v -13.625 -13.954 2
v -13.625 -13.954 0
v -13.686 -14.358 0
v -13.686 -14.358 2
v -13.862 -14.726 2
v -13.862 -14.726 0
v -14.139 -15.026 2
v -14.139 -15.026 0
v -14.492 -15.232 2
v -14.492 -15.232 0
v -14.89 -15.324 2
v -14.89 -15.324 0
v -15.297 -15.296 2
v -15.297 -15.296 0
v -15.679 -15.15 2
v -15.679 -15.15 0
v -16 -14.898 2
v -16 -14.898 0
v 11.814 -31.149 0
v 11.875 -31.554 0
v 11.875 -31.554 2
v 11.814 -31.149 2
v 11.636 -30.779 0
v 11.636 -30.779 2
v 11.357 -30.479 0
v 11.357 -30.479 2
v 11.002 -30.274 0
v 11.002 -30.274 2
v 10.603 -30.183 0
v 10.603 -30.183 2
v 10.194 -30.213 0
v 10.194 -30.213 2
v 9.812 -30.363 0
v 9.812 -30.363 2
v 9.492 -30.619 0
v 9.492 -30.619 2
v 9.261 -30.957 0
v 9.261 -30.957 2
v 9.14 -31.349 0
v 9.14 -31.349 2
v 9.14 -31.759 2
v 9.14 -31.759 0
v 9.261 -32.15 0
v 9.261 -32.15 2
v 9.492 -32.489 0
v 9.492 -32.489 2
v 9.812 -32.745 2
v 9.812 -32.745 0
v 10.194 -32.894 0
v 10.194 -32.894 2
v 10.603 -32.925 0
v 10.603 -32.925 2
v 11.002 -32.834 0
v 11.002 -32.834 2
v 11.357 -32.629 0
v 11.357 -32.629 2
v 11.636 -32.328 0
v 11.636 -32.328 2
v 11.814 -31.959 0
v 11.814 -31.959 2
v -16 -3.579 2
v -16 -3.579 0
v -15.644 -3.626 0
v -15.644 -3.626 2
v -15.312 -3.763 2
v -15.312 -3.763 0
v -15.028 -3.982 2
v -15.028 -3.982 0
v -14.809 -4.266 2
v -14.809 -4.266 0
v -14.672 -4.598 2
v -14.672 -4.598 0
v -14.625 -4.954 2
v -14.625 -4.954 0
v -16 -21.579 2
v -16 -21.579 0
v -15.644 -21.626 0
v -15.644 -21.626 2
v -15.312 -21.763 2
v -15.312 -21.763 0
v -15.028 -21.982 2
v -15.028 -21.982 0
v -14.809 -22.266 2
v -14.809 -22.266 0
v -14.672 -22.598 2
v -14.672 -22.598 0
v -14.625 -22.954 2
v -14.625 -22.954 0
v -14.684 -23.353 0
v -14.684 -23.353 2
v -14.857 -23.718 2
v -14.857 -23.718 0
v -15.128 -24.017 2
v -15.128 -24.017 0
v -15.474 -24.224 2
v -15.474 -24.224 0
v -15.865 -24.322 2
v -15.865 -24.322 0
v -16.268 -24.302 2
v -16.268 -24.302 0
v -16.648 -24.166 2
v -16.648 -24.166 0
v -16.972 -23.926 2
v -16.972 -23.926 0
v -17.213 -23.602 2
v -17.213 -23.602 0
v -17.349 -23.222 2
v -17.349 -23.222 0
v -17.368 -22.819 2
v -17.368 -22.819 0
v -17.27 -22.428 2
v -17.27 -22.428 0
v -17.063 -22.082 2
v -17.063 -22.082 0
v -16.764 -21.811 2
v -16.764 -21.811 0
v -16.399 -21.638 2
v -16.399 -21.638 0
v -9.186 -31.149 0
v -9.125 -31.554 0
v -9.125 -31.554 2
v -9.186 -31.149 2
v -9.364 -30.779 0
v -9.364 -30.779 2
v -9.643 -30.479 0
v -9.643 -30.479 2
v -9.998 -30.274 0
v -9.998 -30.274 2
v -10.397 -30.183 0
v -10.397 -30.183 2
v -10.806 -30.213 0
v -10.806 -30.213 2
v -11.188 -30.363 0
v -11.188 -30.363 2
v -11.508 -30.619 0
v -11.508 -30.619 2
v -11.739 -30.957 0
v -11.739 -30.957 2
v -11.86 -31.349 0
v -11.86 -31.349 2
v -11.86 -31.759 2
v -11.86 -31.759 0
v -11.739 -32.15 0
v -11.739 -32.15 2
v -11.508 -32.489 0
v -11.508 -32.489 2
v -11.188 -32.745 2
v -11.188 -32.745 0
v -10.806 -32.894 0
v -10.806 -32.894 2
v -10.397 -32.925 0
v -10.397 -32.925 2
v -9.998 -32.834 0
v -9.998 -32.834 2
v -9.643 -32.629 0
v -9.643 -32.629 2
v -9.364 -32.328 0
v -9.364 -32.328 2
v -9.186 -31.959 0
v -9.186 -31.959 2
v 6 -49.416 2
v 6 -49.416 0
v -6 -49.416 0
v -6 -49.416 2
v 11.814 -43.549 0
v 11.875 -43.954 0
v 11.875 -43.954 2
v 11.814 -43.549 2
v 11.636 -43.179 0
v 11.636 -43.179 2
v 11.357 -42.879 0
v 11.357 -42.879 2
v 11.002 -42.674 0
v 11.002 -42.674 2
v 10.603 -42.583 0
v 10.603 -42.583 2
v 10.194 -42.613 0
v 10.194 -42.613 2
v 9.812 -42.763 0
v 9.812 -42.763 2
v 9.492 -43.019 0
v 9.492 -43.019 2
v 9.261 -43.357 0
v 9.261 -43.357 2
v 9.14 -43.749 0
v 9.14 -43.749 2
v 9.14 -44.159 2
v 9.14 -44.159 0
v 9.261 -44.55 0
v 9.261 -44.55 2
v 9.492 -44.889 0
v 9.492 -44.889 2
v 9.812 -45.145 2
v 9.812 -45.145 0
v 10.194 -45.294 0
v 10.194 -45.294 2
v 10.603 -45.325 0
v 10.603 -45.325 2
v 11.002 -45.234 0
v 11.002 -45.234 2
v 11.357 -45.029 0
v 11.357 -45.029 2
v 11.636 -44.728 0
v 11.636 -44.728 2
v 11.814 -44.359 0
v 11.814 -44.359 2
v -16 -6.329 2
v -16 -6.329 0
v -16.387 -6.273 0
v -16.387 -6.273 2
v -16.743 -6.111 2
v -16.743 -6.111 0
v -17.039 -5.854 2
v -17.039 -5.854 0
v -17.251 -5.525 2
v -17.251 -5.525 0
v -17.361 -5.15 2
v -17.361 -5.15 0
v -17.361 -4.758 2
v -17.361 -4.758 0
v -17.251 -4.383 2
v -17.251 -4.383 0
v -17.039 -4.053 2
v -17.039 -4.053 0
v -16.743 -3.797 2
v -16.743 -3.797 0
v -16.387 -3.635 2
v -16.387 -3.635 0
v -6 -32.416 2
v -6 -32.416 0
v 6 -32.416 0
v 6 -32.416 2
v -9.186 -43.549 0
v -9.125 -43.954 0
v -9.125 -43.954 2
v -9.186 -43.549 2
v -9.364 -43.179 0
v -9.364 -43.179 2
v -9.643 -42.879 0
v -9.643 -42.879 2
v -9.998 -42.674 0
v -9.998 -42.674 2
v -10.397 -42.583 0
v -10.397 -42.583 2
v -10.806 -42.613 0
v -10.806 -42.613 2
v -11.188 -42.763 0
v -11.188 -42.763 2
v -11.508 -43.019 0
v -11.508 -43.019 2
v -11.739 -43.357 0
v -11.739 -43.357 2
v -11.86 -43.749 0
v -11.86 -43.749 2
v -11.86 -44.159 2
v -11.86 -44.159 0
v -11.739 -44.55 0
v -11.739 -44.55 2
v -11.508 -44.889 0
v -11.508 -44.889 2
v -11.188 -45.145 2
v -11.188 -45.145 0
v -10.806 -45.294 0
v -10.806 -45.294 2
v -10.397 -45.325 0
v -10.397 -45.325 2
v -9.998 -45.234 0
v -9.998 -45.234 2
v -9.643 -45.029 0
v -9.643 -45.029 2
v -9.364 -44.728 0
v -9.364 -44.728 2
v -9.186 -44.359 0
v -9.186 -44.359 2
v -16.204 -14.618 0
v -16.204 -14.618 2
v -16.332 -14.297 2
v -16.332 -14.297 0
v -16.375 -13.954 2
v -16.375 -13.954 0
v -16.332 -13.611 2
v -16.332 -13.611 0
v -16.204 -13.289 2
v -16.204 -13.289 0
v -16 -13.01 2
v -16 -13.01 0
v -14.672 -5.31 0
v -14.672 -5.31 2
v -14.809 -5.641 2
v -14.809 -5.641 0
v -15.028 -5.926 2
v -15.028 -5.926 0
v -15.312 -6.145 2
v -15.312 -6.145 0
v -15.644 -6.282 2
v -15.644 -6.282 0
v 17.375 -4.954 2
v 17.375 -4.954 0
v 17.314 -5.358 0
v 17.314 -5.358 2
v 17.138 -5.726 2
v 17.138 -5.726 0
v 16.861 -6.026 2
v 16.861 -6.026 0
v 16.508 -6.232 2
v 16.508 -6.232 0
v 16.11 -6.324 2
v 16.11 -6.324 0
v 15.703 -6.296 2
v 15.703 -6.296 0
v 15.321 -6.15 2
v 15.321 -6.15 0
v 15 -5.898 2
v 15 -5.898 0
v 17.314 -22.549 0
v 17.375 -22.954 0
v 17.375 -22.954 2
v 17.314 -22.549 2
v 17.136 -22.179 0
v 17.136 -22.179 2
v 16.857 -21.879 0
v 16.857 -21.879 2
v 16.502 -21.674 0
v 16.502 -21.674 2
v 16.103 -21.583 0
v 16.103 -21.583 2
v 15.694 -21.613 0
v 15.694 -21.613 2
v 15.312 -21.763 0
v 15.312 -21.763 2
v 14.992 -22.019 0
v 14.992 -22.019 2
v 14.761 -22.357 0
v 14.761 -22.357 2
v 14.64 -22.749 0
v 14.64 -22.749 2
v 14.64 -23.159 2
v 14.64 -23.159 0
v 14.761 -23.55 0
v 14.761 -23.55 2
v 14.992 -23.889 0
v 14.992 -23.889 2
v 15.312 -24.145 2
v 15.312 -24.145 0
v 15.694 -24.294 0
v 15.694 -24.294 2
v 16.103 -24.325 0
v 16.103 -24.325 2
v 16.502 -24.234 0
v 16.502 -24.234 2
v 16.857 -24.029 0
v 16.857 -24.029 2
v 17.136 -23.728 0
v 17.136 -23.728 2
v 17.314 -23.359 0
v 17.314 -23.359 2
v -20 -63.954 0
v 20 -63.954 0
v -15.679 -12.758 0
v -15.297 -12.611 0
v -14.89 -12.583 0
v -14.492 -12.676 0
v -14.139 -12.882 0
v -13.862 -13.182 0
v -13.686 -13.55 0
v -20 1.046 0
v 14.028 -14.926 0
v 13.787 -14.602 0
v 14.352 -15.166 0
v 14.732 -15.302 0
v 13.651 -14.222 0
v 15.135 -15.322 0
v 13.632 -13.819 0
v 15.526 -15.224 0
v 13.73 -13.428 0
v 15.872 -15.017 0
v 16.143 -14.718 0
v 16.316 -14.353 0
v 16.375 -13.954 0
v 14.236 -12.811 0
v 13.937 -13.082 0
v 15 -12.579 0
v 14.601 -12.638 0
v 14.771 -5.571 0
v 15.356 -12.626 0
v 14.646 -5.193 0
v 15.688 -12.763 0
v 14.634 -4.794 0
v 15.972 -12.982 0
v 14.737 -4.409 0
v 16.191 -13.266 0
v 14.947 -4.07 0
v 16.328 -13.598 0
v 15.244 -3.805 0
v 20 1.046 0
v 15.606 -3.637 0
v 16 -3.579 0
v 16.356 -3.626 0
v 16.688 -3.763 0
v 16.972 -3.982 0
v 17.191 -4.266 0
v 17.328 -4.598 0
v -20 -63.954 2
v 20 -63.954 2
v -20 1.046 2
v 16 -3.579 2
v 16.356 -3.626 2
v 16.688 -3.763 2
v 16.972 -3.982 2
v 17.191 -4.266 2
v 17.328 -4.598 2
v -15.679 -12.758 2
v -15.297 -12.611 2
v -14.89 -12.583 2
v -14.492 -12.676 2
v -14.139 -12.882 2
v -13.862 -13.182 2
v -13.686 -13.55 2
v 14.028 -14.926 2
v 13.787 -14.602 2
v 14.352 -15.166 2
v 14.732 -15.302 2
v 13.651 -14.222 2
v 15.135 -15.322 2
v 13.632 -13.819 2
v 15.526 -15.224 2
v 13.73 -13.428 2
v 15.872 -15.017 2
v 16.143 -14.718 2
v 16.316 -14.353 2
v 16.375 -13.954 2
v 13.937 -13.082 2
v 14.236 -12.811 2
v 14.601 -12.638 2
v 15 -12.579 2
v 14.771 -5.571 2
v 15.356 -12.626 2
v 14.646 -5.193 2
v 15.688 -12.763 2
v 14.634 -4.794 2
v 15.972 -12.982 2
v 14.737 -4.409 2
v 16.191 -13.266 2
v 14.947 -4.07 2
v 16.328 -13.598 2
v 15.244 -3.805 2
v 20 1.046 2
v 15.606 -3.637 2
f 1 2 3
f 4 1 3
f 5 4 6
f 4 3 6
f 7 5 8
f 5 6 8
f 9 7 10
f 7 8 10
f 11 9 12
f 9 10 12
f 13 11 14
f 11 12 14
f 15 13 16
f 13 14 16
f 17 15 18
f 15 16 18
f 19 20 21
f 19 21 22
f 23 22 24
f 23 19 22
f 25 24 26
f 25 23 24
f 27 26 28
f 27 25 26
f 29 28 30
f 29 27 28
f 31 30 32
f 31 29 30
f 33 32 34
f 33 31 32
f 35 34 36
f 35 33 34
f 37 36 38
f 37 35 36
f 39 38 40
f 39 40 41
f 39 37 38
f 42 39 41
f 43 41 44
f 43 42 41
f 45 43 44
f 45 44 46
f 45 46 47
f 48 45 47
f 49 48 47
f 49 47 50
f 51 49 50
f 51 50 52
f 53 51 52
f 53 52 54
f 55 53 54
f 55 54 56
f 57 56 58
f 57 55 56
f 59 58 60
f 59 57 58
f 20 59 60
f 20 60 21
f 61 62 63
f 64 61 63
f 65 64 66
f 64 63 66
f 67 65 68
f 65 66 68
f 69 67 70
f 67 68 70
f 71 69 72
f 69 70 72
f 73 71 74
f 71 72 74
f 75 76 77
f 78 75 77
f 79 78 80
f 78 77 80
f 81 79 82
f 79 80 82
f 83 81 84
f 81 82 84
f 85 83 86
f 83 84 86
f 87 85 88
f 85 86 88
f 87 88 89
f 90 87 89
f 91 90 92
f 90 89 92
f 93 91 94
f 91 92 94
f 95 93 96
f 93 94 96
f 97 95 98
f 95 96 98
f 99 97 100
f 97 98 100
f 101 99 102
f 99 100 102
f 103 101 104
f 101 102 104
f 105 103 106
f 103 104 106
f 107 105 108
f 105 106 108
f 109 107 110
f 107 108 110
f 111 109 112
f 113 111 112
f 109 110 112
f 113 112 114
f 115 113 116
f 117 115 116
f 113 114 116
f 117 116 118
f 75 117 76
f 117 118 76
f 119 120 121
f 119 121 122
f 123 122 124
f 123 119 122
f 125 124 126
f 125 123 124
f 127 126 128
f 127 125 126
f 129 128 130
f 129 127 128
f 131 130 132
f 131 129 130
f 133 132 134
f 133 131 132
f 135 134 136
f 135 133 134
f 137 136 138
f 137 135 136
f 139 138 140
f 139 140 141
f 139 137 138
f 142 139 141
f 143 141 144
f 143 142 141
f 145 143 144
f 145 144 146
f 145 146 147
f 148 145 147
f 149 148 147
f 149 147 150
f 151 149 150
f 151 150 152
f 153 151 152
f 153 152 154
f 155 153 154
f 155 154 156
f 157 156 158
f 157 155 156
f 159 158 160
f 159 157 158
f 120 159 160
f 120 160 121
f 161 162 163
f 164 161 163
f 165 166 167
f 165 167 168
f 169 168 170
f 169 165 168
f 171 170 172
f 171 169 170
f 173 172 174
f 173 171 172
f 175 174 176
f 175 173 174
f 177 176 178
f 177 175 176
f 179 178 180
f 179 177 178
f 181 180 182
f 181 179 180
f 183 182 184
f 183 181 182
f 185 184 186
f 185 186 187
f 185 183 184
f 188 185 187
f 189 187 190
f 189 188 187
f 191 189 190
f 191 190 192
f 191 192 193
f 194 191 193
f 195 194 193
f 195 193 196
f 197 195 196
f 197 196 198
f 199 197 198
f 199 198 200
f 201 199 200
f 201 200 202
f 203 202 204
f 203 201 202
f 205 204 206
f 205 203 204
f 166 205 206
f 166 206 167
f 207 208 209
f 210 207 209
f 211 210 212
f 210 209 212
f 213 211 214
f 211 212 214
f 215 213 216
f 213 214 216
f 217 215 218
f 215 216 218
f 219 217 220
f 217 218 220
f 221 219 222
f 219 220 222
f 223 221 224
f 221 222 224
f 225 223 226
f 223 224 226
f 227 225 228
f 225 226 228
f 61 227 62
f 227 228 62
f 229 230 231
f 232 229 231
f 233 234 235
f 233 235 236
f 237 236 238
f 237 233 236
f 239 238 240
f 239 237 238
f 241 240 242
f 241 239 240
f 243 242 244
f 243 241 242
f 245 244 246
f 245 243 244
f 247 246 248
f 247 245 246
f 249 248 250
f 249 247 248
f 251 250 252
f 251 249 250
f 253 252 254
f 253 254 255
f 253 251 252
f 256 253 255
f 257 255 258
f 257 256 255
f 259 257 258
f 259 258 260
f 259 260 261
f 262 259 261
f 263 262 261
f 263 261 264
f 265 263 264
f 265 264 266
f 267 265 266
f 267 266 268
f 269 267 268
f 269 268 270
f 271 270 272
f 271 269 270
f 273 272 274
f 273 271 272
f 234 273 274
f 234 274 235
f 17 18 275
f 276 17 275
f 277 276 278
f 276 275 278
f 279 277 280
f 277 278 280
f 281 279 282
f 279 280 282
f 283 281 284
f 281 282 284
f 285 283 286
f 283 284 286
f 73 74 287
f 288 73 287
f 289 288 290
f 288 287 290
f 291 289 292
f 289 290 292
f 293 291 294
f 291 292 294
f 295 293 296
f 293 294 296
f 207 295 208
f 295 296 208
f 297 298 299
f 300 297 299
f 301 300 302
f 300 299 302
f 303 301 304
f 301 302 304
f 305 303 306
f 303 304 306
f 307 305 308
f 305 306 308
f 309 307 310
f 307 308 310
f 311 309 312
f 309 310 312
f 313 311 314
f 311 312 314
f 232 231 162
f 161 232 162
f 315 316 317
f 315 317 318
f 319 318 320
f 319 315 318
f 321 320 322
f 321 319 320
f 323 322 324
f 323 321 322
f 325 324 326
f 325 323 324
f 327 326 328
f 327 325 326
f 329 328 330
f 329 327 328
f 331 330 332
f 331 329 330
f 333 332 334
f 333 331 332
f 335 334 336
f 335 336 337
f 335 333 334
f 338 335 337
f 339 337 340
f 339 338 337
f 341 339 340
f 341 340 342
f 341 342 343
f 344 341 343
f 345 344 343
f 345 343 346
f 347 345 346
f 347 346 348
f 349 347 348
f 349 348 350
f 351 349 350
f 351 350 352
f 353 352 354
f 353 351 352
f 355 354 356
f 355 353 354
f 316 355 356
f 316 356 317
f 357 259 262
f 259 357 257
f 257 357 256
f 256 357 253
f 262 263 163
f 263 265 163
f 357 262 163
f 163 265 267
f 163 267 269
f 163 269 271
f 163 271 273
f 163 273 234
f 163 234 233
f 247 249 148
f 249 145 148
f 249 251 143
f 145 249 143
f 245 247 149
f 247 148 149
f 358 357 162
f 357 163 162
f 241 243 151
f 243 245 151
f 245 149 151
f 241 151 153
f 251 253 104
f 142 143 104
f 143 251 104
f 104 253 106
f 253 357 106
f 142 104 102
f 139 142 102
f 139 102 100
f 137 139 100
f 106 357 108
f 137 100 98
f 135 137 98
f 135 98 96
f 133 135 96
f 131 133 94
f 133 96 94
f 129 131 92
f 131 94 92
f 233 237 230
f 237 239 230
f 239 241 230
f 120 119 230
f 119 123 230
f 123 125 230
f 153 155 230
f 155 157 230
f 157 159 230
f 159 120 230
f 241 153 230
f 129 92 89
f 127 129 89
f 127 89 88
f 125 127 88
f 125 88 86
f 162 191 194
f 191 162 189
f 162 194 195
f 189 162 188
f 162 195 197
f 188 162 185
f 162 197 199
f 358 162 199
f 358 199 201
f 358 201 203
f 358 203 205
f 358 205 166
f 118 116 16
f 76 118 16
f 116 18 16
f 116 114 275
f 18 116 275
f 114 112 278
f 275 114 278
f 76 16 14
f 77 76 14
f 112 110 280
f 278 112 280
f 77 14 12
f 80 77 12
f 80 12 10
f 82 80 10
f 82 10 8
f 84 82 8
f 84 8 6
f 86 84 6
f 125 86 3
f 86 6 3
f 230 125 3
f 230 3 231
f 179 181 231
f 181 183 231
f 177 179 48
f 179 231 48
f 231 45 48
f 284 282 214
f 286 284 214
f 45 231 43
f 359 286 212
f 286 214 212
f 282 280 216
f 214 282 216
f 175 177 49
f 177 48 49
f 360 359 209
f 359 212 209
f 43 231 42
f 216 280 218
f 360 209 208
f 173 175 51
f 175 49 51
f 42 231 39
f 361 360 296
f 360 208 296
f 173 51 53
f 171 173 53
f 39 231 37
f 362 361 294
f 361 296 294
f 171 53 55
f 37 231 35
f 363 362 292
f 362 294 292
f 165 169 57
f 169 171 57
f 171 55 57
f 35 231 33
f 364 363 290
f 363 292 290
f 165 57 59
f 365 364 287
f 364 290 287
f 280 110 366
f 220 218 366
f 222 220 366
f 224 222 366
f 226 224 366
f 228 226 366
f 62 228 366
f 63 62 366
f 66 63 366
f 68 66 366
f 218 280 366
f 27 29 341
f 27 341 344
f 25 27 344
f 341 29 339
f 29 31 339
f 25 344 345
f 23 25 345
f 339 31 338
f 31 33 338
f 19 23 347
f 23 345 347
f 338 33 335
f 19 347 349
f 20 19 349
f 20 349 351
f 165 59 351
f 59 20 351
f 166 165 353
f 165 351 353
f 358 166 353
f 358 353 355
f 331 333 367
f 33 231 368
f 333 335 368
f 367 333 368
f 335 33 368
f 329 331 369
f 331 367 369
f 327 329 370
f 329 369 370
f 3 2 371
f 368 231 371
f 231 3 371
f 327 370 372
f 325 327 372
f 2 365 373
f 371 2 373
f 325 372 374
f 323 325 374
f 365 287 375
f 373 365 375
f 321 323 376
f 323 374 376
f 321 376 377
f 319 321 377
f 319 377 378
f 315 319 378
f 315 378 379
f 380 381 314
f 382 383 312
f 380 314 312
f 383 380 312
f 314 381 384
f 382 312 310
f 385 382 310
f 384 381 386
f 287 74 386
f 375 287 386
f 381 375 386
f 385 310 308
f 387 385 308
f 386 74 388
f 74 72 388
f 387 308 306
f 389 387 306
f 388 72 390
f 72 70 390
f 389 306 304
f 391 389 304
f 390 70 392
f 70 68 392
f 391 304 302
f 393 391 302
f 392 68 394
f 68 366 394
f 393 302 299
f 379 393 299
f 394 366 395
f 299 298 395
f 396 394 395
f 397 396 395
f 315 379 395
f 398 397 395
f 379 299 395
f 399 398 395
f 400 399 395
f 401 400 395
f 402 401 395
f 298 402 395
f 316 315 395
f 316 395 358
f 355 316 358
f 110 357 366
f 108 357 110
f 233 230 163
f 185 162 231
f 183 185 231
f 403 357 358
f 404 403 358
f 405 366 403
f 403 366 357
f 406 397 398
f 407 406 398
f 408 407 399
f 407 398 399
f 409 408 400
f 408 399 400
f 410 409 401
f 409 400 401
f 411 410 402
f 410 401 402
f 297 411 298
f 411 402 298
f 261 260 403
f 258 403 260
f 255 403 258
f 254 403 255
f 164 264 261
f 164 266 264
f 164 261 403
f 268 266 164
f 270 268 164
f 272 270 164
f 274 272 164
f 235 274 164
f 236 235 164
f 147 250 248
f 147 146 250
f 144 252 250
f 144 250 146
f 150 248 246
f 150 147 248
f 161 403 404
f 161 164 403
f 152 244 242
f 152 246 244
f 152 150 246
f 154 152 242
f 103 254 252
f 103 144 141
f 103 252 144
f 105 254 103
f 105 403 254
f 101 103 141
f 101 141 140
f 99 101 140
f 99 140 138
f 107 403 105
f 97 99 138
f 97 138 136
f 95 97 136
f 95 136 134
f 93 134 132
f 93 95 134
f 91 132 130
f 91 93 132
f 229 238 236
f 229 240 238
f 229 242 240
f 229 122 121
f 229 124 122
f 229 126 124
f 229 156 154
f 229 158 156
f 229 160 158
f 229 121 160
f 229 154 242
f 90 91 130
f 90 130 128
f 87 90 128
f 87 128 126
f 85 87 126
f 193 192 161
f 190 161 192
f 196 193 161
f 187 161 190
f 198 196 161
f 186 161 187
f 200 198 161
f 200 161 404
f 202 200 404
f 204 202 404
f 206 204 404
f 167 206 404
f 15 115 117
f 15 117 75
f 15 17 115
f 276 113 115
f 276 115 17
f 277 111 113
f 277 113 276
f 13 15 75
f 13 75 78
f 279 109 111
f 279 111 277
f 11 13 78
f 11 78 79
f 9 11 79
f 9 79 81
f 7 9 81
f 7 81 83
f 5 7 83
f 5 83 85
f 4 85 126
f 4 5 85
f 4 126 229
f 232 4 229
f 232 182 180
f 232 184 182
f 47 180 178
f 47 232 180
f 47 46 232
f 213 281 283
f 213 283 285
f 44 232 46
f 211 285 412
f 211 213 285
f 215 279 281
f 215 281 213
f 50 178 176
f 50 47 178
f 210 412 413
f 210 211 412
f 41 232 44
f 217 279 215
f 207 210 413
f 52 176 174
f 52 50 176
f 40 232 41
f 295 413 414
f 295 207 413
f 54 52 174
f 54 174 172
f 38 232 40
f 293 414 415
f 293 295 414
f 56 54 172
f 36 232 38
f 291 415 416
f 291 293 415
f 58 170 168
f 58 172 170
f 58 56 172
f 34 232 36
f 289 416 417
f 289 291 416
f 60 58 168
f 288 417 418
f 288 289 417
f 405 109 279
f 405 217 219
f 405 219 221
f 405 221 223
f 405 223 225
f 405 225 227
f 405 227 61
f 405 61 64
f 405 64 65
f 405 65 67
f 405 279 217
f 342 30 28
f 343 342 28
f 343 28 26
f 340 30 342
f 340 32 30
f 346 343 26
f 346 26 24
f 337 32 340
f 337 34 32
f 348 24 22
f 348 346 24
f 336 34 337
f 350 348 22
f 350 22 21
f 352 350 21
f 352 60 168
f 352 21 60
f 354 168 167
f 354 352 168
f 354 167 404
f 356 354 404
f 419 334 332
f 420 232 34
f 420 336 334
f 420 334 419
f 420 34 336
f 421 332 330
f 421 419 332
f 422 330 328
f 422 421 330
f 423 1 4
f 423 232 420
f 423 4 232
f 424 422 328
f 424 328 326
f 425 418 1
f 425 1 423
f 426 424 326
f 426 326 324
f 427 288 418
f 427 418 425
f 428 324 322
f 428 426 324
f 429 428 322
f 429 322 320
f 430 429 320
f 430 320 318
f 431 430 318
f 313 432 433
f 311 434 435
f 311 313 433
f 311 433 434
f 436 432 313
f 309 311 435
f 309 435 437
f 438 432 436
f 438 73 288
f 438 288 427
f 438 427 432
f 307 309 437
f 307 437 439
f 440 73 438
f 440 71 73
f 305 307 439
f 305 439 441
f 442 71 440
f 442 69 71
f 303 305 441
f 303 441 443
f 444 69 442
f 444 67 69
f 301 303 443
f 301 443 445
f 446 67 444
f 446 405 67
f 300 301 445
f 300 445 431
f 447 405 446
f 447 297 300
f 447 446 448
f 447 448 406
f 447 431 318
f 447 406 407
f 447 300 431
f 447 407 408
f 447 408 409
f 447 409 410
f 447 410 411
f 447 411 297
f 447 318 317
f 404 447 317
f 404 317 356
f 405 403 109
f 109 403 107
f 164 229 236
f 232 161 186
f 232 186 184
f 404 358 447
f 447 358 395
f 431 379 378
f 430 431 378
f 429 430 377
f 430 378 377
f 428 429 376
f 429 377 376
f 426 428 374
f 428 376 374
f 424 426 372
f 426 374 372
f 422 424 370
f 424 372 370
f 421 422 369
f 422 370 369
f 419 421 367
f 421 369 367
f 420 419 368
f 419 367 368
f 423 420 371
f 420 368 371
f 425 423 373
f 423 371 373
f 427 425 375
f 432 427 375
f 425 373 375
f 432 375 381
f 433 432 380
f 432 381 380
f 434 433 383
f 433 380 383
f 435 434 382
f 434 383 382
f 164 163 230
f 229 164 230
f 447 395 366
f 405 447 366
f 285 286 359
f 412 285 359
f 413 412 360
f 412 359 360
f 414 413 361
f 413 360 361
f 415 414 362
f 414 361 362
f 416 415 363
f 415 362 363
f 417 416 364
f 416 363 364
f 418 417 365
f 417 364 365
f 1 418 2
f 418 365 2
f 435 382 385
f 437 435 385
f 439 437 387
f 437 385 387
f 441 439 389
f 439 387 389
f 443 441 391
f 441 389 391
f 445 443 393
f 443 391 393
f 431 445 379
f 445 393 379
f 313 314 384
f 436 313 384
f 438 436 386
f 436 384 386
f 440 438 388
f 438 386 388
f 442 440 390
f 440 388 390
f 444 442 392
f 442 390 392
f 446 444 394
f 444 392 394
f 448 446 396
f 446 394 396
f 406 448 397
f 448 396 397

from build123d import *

# Parameters (mm, degrees)
F0_R     = 1.375
F1_DEPTH = 2


with BuildPart() as f1:
    # F0 (on Top) → F1 (new body)
    with BuildSketch(Plane.XY):
        Polygon((0, -63.953846), (20, -63.953846), (20, 1.046154), (16, 1.046154), (-16, 1.046154), (-20, 1.046154), (-20, -63.953846), align=None)
        with Locations((-10.5, -43.953846)):
            Circle(F0_R, mode=Mode.SUBTRACT)
        with Locations((-10.5, -31.553846)):
            Circle(F0_R, mode=Mode.SUBTRACT)
        Polygon((-6, -32.415846), (0, -32.415846), (6, -32.415846), (6, -49.415846), (-6, -49.415846), align=None, mode=Mode.SUBTRACT)
        with Locations((10.5, -43.953846)):
            Circle(F0_R, mode=Mode.SUBTRACT)
        with Locations((10.5, -31.553846)):
            Circle(F0_R, mode=Mode.SUBTRACT)
        with BuildLine():
            ThreePointArc((-14.625, -22.953846), (-16.972272, -23.926118), (-16, -21.578846))
            ThreePointArc((-16, -21.578846), (-15.027728, -21.981574), (-14.625, -22.953846))
        make_face(mode=Mode.SUBTRACT)
        with BuildLine():
            ThreePointArc((-16, -14.897575), (-16.375, -13.953846), (-16, -13.010117))
            ThreePointArc((-16, -13.010117), (-14.492248, -12.676031), (-13.625, -13.953846))
            ThreePointArc((-13.625, -13.953846), (-14.492248, -15.231662), (-16, -14.897575))
        make_face(mode=Mode.SUBTRACT)
        with BuildLine():
            ThreePointArc((-16, -6.328846), (-17.375, -4.953846), (-16, -3.578846))
            ThreePointArc((-16, -3.578846), (-15.027728, -3.981574), (-14.625, -4.953846))
            ThreePointArc((-14.625, -4.953846), (-15.027728, -5.926118), (-16, -6.328846))
        make_face(mode=Mode.SUBTRACT)
        with Locations((16, -22.953846)):
            Circle(F0_R, mode=Mode.SUBTRACT)
        with BuildLine():
            ThreePointArc((16.375, -13.953846), (14.027728, -14.926118), (15, -12.578846))
            ThreePointArc((15, -12.578846), (15.972272, -12.981574), (16.375, -13.953846))
        make_face(mode=Mode.SUBTRACT)
        with BuildLine():
            ThreePointArc((15, -5.897575), (14.737413, -4.409329), (16, -3.578846))
            ThreePointArc((16, -3.578846), (16.972272, -3.981574), (17.375, -4.953846))
            ThreePointArc((17.375, -4.953846), (16.507752, -6.231662), (15, -5.897575))
        make_face(mode=Mode.SUBTRACT)
    extrude(amount=F1_DEPTH)


solid = f1.part
